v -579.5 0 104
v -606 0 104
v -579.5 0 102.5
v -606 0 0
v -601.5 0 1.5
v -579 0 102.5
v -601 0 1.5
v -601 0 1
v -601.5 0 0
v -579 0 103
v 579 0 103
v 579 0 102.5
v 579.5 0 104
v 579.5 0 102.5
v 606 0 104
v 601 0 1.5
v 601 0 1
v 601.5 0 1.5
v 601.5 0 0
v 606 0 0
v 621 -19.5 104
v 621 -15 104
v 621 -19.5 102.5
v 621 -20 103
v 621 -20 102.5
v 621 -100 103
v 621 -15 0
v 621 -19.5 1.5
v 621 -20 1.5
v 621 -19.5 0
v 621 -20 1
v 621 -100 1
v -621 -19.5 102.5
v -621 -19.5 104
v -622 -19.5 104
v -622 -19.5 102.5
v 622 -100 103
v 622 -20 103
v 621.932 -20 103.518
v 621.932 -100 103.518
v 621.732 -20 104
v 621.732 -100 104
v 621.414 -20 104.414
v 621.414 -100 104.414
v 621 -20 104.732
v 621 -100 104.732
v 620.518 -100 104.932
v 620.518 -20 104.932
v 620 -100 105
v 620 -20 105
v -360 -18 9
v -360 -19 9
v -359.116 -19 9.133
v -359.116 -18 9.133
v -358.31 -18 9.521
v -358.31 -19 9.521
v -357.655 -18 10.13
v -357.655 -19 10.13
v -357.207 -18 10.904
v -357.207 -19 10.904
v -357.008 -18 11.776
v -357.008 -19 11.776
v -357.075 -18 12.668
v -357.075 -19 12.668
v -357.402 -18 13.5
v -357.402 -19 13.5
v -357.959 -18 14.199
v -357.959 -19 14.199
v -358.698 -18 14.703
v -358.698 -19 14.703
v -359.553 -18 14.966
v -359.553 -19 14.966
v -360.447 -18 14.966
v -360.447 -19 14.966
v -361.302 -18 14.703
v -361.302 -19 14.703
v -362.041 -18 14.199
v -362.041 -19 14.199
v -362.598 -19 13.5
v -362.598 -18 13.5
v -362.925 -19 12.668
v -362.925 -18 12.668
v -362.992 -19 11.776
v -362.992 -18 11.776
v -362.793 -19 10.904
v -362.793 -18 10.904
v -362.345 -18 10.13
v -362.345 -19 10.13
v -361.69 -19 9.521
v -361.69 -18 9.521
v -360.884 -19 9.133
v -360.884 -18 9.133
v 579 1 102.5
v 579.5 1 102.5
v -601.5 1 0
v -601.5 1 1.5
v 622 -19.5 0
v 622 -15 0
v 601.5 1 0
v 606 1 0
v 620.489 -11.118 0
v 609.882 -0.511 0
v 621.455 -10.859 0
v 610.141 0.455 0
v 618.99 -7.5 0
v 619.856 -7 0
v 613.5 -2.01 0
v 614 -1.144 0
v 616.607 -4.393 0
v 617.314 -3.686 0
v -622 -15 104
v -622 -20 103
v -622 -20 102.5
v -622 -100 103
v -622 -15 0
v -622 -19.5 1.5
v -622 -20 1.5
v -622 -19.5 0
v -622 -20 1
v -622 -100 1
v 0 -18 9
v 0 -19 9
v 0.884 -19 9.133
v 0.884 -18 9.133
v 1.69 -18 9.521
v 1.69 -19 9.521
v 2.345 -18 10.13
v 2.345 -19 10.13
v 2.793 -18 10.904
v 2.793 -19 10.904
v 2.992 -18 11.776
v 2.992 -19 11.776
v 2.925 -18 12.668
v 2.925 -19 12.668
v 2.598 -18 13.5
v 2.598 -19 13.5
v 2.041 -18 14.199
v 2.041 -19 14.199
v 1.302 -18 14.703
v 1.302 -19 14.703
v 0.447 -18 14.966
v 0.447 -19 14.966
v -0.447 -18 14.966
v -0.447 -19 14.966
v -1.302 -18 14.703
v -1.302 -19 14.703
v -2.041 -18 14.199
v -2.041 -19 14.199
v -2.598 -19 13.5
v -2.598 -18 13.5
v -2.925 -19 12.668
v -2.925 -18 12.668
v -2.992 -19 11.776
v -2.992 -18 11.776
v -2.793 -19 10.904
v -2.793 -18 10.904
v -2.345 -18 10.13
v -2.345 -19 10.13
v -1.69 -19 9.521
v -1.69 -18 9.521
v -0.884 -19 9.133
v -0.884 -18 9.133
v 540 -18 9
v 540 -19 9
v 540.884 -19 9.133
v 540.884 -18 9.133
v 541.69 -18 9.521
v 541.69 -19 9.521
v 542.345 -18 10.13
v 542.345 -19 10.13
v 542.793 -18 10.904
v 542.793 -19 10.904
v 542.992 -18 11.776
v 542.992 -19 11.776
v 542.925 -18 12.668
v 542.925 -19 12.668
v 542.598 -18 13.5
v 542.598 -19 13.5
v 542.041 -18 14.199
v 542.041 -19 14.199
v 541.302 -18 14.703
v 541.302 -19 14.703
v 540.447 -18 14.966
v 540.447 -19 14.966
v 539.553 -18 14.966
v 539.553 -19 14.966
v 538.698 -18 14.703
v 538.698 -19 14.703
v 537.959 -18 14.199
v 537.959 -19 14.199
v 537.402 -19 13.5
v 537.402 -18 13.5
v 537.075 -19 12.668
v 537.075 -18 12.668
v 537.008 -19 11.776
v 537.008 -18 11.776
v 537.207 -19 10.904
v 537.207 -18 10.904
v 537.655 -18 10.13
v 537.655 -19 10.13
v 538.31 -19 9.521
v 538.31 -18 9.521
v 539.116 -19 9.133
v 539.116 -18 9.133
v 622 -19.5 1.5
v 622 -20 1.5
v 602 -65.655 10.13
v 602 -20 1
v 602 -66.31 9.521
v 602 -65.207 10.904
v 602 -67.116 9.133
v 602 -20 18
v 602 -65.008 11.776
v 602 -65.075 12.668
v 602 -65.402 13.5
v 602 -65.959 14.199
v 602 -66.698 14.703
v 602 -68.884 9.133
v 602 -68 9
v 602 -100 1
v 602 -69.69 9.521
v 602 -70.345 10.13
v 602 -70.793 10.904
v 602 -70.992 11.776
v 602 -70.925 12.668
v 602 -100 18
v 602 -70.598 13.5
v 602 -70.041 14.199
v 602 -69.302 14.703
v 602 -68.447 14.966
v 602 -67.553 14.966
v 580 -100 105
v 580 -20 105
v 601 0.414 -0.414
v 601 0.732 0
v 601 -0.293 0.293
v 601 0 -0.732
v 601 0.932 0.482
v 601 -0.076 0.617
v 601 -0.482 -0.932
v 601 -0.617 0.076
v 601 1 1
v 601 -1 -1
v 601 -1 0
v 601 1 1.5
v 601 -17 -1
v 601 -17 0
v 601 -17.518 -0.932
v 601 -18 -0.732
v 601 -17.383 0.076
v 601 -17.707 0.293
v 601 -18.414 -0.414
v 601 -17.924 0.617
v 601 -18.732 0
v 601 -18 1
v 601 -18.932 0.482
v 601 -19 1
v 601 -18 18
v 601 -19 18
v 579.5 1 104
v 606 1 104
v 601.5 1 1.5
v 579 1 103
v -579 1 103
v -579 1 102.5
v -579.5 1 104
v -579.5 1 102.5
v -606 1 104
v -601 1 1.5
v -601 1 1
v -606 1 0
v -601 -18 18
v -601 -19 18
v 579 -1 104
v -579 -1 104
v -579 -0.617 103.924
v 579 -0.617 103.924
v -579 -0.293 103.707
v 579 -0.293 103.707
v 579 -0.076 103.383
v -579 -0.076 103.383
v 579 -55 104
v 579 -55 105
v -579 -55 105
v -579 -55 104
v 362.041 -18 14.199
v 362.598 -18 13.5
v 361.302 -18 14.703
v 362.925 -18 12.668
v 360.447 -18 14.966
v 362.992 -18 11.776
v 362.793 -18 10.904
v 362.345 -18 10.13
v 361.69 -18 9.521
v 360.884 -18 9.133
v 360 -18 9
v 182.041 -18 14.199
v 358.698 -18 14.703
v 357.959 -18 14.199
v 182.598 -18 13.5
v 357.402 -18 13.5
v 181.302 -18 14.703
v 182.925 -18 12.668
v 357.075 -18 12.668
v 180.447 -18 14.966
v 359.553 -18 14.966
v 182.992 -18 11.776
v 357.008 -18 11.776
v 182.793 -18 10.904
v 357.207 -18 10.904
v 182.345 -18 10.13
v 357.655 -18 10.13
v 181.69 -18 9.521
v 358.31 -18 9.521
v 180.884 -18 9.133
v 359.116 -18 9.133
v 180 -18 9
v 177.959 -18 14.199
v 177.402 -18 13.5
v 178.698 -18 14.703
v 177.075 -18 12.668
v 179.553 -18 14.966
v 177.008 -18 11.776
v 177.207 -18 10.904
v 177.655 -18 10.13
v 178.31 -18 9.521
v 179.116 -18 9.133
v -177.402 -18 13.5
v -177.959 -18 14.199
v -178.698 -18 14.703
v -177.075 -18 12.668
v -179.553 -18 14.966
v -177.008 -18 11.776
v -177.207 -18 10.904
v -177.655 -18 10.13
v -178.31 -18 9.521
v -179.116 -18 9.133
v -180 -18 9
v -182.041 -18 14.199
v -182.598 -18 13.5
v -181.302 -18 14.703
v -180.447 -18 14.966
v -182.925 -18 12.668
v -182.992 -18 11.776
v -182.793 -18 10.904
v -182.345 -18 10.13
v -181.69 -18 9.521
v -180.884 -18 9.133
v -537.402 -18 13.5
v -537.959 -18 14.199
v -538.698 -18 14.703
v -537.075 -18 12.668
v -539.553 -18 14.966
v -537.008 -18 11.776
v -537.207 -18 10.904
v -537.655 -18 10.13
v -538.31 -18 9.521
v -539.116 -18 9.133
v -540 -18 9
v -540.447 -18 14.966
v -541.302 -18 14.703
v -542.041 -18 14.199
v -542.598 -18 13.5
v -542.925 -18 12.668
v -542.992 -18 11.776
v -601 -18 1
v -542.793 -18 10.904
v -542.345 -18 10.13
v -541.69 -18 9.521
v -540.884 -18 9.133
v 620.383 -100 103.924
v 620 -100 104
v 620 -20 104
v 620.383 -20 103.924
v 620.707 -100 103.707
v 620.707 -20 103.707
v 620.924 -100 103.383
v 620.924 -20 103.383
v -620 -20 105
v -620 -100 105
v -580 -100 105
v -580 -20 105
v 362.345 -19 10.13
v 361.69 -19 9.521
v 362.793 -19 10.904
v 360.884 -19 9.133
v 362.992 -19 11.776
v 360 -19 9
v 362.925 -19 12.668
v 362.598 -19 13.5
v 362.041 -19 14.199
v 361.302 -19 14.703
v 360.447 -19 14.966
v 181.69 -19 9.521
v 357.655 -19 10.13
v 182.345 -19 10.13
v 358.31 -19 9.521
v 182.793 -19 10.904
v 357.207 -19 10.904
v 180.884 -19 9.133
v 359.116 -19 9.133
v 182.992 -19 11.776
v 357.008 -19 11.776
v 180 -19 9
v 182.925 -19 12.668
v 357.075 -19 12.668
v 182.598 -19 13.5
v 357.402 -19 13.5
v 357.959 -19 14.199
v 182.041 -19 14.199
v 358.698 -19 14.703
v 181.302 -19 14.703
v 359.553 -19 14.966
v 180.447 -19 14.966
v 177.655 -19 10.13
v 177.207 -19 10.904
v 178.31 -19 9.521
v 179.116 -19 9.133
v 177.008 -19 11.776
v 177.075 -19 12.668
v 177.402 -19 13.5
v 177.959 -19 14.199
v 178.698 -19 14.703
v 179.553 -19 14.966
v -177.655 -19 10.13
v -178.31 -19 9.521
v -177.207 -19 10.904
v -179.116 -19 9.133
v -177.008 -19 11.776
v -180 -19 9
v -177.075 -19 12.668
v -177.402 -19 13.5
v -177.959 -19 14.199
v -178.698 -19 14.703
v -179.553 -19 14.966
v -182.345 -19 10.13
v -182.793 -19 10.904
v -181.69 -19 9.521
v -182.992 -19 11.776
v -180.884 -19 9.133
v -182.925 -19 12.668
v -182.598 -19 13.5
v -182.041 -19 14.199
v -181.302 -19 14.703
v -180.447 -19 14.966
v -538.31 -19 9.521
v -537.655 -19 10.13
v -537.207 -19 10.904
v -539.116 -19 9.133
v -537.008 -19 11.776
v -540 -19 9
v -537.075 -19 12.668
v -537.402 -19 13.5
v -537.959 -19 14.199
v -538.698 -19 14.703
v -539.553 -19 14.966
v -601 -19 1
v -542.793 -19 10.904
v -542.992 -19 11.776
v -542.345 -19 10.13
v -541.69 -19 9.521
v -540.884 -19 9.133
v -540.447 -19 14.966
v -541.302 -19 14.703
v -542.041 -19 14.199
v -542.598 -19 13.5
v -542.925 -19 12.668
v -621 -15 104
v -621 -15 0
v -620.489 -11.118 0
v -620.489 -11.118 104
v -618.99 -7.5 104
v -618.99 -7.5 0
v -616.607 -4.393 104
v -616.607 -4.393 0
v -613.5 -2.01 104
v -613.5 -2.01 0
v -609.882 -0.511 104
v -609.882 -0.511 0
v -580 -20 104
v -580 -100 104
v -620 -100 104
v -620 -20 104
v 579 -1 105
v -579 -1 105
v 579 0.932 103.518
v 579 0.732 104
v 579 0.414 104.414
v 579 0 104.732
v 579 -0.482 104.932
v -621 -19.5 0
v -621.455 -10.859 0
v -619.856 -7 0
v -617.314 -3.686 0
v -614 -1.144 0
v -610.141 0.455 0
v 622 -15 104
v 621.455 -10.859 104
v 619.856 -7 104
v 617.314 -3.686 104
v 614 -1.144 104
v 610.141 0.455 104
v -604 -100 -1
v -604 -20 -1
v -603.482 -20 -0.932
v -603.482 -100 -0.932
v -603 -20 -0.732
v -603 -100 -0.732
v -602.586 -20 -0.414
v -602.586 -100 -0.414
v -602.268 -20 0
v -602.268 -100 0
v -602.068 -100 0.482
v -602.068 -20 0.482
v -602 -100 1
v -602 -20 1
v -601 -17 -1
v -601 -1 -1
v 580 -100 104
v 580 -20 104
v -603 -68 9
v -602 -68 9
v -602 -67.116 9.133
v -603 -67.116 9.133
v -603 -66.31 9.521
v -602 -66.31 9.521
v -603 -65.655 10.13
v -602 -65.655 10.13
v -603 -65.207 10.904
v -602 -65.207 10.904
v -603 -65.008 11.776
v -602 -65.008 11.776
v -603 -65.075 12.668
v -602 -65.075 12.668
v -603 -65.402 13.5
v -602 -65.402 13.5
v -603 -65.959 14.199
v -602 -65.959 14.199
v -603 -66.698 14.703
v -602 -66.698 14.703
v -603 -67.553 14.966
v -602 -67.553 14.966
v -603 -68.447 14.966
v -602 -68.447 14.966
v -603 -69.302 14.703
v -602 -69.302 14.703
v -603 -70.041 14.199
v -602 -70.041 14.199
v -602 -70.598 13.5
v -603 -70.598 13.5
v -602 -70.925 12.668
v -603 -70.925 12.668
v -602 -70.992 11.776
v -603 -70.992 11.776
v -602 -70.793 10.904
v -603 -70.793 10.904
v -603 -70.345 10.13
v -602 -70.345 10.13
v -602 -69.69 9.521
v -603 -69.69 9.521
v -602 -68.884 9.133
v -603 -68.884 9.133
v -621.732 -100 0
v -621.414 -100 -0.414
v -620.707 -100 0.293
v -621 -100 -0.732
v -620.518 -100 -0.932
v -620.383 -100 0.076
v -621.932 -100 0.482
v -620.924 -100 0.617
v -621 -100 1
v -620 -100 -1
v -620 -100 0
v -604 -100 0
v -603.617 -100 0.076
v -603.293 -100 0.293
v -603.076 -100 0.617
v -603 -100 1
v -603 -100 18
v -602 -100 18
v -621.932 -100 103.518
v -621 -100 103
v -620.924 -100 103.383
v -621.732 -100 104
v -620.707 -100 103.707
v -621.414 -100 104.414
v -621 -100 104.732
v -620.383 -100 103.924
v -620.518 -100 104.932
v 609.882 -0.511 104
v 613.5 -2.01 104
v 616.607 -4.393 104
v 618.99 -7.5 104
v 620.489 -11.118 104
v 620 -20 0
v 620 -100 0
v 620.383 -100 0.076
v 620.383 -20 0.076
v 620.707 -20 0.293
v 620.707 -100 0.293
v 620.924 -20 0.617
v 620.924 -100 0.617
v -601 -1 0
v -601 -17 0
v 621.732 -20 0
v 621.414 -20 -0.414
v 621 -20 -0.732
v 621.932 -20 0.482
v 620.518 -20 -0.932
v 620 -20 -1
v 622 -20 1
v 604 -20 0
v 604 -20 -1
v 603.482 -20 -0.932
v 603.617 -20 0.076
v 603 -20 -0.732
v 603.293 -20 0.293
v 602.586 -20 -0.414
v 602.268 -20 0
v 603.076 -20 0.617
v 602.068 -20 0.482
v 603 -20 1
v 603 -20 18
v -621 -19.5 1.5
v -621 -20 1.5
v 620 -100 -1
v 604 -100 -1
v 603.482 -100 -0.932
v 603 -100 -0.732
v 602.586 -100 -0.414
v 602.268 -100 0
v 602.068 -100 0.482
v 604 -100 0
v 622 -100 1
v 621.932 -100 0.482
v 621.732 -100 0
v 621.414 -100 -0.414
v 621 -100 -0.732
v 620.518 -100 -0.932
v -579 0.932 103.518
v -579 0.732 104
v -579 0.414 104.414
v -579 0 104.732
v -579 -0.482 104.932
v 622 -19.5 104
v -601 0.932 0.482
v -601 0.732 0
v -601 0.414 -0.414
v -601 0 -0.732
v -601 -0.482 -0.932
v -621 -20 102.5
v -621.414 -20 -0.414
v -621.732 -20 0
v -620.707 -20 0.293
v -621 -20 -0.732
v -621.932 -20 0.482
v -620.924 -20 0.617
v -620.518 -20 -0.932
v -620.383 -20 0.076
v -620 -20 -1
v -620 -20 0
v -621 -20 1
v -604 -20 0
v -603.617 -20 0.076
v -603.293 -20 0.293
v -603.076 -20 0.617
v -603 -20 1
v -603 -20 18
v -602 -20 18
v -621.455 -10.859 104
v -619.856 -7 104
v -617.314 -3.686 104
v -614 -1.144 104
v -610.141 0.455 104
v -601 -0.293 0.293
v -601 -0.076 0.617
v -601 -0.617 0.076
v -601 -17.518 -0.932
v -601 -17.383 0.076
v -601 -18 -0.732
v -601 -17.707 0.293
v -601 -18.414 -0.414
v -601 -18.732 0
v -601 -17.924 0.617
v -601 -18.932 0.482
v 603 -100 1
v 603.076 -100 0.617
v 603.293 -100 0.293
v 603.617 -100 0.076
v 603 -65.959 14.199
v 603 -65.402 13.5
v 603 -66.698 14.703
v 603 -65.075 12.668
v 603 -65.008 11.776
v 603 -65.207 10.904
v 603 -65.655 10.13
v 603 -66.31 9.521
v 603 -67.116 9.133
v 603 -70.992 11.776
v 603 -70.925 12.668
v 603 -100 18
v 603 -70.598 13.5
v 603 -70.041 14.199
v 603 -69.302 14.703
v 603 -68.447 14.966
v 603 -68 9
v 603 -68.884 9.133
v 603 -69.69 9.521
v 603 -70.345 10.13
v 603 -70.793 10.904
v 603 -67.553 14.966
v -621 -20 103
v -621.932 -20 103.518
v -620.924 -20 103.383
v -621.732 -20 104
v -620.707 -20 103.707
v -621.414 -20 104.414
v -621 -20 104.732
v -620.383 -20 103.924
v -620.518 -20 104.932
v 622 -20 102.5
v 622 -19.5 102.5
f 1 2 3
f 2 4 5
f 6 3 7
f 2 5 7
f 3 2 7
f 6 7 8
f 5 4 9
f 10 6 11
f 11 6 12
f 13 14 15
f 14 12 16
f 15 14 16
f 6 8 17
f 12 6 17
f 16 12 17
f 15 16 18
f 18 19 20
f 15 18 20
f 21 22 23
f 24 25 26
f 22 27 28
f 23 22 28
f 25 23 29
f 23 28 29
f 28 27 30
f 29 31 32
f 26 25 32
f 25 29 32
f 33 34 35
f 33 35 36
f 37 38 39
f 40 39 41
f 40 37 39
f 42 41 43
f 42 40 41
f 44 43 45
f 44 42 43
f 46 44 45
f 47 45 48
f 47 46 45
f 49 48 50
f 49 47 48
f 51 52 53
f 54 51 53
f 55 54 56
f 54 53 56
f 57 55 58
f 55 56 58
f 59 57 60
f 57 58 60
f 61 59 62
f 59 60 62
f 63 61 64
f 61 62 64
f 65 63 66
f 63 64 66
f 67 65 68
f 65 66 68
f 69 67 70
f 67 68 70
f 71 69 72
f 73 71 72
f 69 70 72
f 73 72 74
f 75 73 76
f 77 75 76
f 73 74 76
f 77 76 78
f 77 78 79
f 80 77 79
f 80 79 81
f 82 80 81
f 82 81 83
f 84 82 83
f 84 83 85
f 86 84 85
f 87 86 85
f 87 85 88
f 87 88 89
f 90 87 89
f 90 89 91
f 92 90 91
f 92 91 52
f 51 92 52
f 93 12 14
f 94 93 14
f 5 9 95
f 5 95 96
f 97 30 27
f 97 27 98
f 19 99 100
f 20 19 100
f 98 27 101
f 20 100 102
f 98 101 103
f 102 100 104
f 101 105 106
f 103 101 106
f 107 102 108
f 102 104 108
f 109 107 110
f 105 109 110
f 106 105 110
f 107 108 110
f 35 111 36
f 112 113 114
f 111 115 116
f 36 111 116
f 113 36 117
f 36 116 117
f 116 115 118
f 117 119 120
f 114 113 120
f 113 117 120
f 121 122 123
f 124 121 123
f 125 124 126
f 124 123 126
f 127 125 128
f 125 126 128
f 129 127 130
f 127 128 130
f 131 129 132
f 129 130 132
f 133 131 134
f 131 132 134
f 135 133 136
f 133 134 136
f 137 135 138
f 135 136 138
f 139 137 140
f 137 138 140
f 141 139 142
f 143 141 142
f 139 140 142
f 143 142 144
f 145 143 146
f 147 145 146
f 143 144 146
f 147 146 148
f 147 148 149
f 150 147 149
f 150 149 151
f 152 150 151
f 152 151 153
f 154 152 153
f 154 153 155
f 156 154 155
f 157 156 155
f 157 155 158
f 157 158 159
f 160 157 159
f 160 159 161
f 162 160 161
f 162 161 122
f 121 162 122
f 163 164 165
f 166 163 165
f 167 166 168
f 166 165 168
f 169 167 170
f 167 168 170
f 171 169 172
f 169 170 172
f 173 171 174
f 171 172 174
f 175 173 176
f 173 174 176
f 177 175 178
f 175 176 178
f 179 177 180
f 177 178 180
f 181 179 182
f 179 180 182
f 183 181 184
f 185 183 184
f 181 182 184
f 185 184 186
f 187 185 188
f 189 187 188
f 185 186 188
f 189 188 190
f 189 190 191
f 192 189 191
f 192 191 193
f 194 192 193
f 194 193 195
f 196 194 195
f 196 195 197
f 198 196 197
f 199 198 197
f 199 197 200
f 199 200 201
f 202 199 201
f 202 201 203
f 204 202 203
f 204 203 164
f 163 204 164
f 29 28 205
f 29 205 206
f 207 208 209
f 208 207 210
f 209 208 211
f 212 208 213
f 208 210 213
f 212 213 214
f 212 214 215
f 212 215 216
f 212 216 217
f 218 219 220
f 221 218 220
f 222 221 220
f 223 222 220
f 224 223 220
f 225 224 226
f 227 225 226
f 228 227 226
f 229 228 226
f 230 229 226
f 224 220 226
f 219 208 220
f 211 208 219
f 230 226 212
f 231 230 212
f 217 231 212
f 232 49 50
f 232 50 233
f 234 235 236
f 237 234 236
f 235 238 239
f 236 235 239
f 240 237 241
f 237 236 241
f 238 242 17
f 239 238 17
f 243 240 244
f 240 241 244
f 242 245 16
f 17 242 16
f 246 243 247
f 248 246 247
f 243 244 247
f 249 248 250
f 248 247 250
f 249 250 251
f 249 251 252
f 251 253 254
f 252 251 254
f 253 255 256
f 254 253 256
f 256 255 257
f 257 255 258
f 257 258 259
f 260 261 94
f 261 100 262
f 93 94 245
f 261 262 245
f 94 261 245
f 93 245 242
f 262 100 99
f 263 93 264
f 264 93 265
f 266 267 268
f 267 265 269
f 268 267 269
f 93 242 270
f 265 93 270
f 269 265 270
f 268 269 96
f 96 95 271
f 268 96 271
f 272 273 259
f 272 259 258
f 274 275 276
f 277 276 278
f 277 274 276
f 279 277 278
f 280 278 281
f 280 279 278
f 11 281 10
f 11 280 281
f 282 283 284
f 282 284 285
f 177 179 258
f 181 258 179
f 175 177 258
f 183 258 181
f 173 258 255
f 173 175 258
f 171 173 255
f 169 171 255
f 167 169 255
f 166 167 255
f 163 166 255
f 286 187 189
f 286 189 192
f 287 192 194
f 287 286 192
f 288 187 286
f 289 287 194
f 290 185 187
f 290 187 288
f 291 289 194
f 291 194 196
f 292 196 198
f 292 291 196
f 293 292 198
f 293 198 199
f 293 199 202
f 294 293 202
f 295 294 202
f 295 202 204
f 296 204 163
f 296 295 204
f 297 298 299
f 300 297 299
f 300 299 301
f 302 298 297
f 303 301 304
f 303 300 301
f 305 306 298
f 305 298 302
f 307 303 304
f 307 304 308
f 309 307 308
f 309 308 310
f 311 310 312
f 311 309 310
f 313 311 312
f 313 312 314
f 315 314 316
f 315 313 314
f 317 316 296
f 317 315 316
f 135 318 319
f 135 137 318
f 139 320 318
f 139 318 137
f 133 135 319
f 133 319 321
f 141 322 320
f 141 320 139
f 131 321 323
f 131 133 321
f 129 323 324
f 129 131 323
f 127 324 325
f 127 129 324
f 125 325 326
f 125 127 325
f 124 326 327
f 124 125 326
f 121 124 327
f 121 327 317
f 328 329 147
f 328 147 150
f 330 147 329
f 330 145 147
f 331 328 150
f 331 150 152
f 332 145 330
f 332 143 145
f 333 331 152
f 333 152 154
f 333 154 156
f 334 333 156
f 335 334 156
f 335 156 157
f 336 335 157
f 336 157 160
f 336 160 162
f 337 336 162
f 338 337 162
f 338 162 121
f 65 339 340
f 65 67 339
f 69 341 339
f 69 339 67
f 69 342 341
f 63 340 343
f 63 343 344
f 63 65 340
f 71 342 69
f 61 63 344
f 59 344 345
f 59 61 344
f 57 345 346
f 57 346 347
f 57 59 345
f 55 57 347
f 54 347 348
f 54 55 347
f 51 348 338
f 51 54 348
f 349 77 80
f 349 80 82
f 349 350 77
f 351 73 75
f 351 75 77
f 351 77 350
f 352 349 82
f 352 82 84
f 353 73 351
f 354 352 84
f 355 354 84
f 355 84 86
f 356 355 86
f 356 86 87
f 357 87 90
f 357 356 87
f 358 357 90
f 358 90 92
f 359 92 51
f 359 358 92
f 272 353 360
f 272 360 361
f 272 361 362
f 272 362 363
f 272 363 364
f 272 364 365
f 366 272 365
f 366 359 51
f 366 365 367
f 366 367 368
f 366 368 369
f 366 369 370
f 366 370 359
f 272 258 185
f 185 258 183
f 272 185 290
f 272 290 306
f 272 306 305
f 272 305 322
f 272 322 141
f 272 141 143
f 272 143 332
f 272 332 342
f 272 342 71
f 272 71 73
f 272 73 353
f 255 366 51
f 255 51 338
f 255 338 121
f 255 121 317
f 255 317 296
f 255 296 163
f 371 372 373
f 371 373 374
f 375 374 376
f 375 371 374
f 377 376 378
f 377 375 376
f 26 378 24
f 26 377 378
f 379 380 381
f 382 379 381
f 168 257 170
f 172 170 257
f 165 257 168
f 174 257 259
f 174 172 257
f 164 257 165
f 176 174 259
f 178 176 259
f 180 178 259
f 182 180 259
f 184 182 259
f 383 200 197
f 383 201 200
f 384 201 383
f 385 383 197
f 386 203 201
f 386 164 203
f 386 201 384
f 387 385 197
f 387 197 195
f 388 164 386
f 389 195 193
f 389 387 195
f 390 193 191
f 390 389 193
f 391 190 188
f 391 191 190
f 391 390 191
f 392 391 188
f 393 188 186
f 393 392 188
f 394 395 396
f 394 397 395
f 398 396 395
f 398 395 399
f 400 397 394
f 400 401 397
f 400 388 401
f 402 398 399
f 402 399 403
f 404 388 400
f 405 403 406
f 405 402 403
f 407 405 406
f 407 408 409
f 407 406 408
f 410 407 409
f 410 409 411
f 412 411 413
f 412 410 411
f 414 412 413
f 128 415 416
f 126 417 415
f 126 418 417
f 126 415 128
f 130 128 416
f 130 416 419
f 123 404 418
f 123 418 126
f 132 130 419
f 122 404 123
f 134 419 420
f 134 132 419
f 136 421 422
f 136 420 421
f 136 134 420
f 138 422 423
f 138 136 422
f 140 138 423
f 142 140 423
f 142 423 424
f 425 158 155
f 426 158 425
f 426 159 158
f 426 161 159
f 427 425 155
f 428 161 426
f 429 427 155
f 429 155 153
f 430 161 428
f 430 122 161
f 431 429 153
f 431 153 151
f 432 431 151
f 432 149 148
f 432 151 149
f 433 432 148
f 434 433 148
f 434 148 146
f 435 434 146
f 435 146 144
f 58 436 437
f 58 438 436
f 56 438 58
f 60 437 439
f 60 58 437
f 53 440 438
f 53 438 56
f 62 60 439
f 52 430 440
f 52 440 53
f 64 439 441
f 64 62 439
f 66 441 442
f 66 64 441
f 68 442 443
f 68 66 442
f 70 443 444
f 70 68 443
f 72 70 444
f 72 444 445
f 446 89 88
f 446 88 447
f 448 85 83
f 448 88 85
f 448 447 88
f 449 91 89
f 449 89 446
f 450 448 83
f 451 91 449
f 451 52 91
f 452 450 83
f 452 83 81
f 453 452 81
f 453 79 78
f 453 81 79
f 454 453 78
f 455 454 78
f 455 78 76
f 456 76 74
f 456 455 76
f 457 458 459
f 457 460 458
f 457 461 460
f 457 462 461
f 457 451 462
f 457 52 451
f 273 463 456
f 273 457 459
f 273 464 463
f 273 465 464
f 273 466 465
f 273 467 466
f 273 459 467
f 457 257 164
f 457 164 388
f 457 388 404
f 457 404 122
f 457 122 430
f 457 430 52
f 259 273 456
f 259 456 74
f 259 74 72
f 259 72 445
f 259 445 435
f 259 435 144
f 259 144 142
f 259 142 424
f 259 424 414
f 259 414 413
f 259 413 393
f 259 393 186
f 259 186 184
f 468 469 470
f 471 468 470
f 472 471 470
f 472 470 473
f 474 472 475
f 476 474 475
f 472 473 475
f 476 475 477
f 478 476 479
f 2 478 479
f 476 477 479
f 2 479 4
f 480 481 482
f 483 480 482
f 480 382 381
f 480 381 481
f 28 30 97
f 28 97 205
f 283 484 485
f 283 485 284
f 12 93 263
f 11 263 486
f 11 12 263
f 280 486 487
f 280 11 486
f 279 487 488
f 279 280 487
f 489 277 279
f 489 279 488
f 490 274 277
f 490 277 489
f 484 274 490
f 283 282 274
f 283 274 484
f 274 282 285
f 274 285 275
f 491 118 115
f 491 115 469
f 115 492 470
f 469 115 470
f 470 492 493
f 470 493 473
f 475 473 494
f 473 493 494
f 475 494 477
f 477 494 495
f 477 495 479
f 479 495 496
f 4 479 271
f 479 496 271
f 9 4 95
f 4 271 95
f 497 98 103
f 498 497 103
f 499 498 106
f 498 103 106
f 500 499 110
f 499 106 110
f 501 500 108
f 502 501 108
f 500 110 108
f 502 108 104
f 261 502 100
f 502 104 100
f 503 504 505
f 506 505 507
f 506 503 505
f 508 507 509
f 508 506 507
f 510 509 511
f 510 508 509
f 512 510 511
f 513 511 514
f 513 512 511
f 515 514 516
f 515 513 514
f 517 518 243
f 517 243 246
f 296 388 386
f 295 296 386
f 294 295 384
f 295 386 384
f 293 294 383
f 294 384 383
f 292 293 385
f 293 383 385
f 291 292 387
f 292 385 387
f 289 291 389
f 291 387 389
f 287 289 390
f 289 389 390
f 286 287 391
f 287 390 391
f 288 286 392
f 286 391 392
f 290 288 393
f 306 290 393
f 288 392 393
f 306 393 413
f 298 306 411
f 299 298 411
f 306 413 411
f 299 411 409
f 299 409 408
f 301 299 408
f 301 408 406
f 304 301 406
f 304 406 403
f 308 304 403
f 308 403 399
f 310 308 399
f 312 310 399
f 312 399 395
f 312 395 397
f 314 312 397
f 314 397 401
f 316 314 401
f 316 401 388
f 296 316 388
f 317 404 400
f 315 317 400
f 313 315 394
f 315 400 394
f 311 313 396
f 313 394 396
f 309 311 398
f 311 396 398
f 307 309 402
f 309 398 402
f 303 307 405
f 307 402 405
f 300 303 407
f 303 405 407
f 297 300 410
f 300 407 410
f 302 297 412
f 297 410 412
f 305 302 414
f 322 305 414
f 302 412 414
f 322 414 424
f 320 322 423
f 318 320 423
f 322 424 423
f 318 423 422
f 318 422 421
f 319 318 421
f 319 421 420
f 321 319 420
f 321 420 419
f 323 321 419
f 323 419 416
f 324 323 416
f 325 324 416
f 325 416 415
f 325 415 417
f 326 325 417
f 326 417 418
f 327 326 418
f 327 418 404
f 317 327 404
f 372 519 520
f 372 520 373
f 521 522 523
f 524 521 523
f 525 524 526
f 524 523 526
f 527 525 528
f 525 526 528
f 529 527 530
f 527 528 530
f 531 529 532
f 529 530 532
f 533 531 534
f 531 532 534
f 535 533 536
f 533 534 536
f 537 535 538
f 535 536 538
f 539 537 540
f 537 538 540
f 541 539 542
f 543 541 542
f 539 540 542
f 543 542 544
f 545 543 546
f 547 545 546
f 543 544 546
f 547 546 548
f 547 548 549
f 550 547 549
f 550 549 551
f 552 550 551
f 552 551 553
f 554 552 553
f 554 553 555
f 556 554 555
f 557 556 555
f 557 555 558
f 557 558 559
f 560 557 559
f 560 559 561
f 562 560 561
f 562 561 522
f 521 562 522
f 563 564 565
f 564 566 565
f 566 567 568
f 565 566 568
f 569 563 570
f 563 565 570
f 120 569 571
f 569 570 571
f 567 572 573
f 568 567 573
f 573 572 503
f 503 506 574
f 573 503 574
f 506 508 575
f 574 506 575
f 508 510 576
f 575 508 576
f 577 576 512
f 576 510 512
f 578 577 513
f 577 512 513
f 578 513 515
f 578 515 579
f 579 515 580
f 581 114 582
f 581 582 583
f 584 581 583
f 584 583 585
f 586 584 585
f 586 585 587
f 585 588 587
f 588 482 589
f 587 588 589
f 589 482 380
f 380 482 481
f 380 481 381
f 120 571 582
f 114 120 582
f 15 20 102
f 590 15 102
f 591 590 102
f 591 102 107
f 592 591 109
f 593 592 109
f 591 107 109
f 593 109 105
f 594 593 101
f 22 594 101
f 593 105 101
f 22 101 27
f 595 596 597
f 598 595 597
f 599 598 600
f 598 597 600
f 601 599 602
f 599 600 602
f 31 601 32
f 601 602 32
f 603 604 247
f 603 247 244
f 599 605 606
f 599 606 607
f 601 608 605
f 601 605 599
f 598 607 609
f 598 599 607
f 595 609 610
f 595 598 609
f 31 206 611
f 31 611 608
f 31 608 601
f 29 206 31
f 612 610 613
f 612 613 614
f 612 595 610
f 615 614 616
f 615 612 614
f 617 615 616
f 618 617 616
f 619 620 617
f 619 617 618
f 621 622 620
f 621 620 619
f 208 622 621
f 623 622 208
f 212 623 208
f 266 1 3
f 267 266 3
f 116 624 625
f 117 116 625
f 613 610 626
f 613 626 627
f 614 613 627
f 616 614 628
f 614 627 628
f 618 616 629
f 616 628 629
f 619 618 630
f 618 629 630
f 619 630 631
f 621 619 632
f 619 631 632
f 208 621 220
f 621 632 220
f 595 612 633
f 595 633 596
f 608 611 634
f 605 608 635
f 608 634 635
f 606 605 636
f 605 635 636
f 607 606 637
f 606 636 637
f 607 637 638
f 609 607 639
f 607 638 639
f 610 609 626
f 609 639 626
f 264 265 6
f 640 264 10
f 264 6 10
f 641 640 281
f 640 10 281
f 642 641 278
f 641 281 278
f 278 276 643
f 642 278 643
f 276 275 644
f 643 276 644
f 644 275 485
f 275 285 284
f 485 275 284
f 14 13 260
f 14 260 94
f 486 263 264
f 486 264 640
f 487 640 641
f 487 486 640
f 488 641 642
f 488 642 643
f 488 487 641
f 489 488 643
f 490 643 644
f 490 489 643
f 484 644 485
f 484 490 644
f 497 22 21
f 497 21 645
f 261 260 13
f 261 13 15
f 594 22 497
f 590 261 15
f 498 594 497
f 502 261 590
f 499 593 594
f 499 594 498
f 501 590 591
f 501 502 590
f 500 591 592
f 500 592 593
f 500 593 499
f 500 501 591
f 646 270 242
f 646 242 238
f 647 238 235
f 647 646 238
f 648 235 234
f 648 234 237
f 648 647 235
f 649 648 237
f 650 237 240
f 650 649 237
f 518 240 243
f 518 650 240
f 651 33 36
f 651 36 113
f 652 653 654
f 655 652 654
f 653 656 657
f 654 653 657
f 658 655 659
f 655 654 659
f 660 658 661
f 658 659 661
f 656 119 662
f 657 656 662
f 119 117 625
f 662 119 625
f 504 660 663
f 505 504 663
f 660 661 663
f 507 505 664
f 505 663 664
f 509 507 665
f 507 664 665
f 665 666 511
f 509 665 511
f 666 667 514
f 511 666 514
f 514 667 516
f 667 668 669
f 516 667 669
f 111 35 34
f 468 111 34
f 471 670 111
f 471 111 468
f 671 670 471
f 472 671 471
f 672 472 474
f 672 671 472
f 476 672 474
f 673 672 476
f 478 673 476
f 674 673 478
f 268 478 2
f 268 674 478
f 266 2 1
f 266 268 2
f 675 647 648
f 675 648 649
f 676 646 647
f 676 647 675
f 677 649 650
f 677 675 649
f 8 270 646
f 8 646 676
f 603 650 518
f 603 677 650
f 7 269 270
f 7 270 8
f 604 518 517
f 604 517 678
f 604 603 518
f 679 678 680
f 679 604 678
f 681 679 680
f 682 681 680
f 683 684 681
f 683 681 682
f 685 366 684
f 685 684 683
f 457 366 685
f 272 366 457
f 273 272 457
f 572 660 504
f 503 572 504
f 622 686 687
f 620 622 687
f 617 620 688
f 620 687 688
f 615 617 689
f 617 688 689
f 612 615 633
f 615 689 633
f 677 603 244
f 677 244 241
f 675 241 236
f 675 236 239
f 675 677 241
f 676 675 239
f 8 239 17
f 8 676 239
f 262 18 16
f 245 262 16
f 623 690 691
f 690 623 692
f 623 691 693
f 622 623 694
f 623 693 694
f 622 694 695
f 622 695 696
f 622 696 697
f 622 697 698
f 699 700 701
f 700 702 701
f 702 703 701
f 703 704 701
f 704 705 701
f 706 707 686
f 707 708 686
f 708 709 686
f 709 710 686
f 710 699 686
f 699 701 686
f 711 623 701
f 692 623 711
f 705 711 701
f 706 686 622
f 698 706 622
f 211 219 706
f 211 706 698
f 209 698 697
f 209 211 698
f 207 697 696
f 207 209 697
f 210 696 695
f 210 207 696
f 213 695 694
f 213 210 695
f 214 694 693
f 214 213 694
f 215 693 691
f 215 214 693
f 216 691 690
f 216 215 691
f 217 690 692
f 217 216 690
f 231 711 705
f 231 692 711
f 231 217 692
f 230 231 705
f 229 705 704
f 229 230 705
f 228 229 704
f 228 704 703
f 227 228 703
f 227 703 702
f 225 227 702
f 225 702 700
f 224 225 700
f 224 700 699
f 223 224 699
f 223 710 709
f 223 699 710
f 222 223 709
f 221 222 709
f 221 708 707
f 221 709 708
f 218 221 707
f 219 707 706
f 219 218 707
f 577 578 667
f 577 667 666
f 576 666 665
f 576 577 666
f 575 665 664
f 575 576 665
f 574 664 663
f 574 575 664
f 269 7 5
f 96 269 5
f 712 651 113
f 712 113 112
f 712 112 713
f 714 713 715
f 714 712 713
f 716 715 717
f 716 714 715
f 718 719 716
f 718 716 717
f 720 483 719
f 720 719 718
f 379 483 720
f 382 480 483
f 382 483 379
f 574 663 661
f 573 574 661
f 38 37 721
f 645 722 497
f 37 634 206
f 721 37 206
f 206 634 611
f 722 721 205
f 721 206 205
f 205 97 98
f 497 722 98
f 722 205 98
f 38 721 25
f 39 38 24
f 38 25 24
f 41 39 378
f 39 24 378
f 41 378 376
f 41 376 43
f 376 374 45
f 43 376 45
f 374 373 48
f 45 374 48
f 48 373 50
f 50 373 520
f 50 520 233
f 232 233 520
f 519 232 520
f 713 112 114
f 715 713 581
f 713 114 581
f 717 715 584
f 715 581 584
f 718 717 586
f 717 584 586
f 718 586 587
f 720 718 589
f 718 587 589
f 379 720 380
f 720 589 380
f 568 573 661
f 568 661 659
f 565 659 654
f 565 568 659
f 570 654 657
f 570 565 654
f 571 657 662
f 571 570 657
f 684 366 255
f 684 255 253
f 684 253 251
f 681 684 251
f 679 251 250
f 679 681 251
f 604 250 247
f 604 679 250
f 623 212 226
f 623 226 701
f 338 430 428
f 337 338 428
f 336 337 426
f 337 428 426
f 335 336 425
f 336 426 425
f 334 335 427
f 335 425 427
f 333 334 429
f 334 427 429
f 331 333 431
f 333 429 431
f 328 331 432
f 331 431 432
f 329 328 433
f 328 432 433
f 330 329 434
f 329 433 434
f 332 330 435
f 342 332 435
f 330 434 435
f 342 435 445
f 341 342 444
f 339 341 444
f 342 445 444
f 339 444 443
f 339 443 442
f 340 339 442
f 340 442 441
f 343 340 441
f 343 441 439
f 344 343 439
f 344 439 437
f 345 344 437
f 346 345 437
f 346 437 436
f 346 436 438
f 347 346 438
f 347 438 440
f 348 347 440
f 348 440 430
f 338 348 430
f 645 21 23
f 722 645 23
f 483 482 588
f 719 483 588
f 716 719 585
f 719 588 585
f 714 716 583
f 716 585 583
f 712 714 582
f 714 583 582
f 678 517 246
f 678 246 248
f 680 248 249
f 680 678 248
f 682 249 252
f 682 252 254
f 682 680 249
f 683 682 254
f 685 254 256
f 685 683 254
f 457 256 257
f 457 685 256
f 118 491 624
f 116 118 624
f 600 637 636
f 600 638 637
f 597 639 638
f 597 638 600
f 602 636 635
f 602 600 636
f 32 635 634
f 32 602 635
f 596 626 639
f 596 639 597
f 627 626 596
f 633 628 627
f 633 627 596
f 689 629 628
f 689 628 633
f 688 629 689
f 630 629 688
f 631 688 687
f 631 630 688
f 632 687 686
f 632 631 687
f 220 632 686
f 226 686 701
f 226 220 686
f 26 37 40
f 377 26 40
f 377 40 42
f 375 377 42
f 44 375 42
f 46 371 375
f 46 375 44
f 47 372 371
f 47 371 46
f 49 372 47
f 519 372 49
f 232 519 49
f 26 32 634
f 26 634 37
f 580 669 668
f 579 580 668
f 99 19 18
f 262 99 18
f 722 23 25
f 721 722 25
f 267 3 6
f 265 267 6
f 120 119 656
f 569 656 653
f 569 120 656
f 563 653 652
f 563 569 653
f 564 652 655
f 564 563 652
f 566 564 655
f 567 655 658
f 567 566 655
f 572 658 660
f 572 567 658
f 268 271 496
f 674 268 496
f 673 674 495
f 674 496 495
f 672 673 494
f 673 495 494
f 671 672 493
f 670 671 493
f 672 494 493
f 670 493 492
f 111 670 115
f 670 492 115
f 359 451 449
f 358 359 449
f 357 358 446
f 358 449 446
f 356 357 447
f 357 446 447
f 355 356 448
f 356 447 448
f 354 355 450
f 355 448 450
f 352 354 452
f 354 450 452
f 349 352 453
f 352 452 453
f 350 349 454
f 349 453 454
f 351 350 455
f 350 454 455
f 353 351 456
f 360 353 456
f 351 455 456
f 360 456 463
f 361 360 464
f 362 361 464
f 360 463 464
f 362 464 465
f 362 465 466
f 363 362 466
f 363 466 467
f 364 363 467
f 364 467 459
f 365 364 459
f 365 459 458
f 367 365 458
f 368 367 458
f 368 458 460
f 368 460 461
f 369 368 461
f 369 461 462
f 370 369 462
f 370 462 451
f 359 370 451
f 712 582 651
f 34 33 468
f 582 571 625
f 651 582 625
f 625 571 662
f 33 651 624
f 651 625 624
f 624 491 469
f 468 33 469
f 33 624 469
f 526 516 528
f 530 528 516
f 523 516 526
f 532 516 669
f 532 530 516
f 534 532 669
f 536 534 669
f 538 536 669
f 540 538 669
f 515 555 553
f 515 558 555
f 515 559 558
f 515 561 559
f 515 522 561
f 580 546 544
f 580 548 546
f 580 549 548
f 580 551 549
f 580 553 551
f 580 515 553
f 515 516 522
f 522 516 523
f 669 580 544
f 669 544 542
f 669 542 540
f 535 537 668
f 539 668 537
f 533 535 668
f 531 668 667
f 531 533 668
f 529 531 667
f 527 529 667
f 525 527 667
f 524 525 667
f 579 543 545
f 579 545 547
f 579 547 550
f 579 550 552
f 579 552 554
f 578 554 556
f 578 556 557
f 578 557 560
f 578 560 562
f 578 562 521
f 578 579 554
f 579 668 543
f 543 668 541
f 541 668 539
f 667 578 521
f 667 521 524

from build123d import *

# Parameters (mm, degrees)
BASE_FLANGE1_DEPTH             = 104
EDGE_FLANGE1_STRIP_W           = 6
EDGE_FLANGE1_STRIP_H           = 1
EDGE_FLANGE1_STRIP_CUT_DEPTH   = 1202
EDGE_FLANGE1_RELIEF_W          = 6.5
EDGE_FLANGE1_RELIEF_H          = 0.5
EDGE_FLANGE1_RELIEF_CUT_DEPTH  = 1
EDGE_FLANGE1_DEPTH             = 1202
EDGE_FLANGE2_STRIP_W           = 6
EDGE_FLANGE2_STRIP_H           = 1
EDGE_FLANGE2_STRIP_CUT_DEPTH   = 1202
EDGE_FLANGE2_DEPTH             = 1202
EDGE_FLANGE3_STRIP_W           = 6
EDGE_FLANGE3_STRIP_H           = 1
EDGE_FLANGE3_STRIP_CUT_DEPTH   = 80
EDGE_FLANGE3_RELIEF_W          = 6.5
EDGE_FLANGE3_RELIEF_H          = 0.5
EDGE_FLANGE3_RELIEF_CUT_DEPTH  = 1
EDGE_FLANGE3_DEPTH             = 80
EDGE_FLANGE4_STRIP_W           = 6
EDGE_FLANGE4_STRIP_H           = 1
EDGE_FLANGE4_STRIP_CUT_DEPTH   = 80
EDGE_FLANGE4_DEPTH             = 80
EDGE_FLANGE5_STRIP_W           = 6
EDGE_FLANGE5_STRIP_H           = 1
EDGE_FLANGE5_STRIP_CUT_DEPTH   = 1158
EDGE_FLANGE5_RELIEF_W          = 6.5
EDGE_FLANGE5_RELIEF_H          = 0.5
EDGE_FLANGE5_RELIEF_CUT_DEPTH  = 1
EDGE_FLANGE5_DEPTH             = 1158
EDGE_FLANGE6_STRIP_W           = 6
EDGE_FLANGE6_STRIP_H           = 1
EDGE_FLANGE6_STRIP_CUT_DEPTH   = 80
EDGE_FLANGE6_RELIEF_W          = 6.5
EDGE_FLANGE6_RELIEF_H          = 0.5
EDGE_FLANGE6_RELIEF_CUT_DEPTH  = 1
EDGE_FLANGE6_DEPTH             = 80
SKETCH25_R                     = 3
CUT_EXTRUDE1_DEPTH             = 3
SKETCH26_R                     = 3
CUT_EXTRUDE2_DEPTH             = 3
CUT_EXTRUDE2_DIRECTION_2_REACH = 1234.559


# Sheet-metal steps are written as plain solids
with BuildPart() as part:
    # Sketch1 → Base-Flange1 (new body)
    with BuildSketch(Plane.XY):
        with BuildLine():
            Line((-621, -100), (-621, -15))
            ThreePointArc((-621, -15), (-616.606601718, -4.393398282), (-606, 0))
            Line((-606, 0), (606, 0))
            ThreePointArc((606, 0), (616.606601718, -4.393398282), (621, -15))
            Line((621, -15), (621, -100))
            Line((621, -100), (622, -100))
            Line((622, -100), (622, -15))
            ThreePointArc((622, -15), (617.313708499, -3.686291501), (606, 1))
            Line((606, 1), (-606, 1))
            ThreePointArc((-606, 1), (-617.313708499, -3.686291501), (-622, -15))
            Line((-622, -15), (-622, -100))
            Line((-622, -100), (-621, -100))
        make_face()
    extrude(amount=BASE_FLANGE1_DEPTH)

    # Edge-Flange1 strip (across the edge) → Edge-Flange1 strip cut (cut)
    with BuildSketch(Plane(origin=(-601, 0, 0), x_dir=(0, 0, 1), z_dir=(1, 0, 0))):
        with Locations((-2, -0.5)):
            Rectangle(EDGE_FLANGE1_STRIP_W, EDGE_FLANGE1_STRIP_H)
    extrude(amount=EDGE_FLANGE1_STRIP_CUT_DEPTH, mode=Mode.SUBTRACT)

    # Edge-Flange1 relief (on the sheet) → Edge-Flange1 relief cut (cut)
    with BuildSketch(Plane(origin=(-601, 0, 1), x_dir=(0, 0, 1), z_dir=(0, -1, 0))):
        with Locations((-2.75, 0.25)):
            Rectangle(EDGE_FLANGE1_RELIEF_W, EDGE_FLANGE1_RELIEF_H)
        with Locations((-2.75, -1202.25)):
            Rectangle(EDGE_FLANGE1_RELIEF_W, EDGE_FLANGE1_RELIEF_H)
    extrude(amount=-EDGE_FLANGE1_RELIEF_CUT_DEPTH, mode=Mode.SUBTRACT)

    # Edge-Flange1 section (across the edge) → Edge-Flange1 (add)
    with BuildSketch(Plane(origin=(-601, 0, 0), x_dir=(0, 0, 1), z_dir=(1, 0, 0))):
        with BuildLine():
            Line((-1, 1), (-1, 19))
            Line((-1, 19), (0, 19))
            Line((0, 19), (0, 1))
            ThreePointArc((0, 1), (0.292893219, 0.292893219), (1, 0))
            Line((1, 0), (1, -1))
            ThreePointArc((1, -1), (-0.414213562, -0.414213562), (-1, 1))
        make_face()
    extrude(amount=EDGE_FLANGE1_DEPTH)

    # Edge-Flange2 strip (across the edge) → Edge-Flange2 strip cut (cut)
    with BuildSketch(Plane(origin=(-601, -19, 0), x_dir=(0, 1, 0), z_dir=(1, 0, 0))):
        with Locations((-1, -0.5)):
            Rectangle(EDGE_FLANGE2_STRIP_W, EDGE_FLANGE2_STRIP_H)
    extrude(amount=EDGE_FLANGE2_STRIP_CUT_DEPTH, mode=Mode.SUBTRACT)

    # Edge-Flange2 section (across the edge) → Edge-Flange2 (add)
    with BuildSketch(Plane(origin=(-601, -19, 0), x_dir=(0, 1, 0), z_dir=(1, 0, 0))):
        with BuildLine():
            Line((0, 1), (0, 18))
            Line((0, 18), (1, 18))
            Line((1, 18), (1, 1))
            ThreePointArc((1, 1), (1.292893219, 0.292893219), (2, 0))
            Line((2, 0), (2, -1))
            ThreePointArc((2, -1), (0.585786438, -0.414213562), (0, 1))
        make_face()
    extrude(amount=EDGE_FLANGE2_DEPTH)

    # Edge-Flange3 strip (across the edge) → Edge-Flange3 strip cut (cut)
    with BuildSketch(Plane(origin=(-621, -100, 0), x_dir=(0, 0, 1), z_dir=(0, 1, 0))):
        with Locations((-2, -0.5)):
            Rectangle(EDGE_FLANGE3_STRIP_W, EDGE_FLANGE3_STRIP_H)
    edge_flange3_strip_cut = extrude(amount=EDGE_FLANGE3_STRIP_CUT_DEPTH, mode=Mode.SUBTRACT)

    # Edge-Flange3 relief (on the sheet) → Edge-Flange3 relief cut (cut)
    with BuildSketch(Plane(origin=(-621, -100, 1), x_dir=(0, 0, 1), z_dir=(1, 0, 0))):
        with Locations((-2.75, -80.25)):
            Rectangle(EDGE_FLANGE3_RELIEF_W, EDGE_FLANGE3_RELIEF_H)
    edge_flange3_relief_cut = extrude(amount=-EDGE_FLANGE3_RELIEF_CUT_DEPTH, mode=Mode.SUBTRACT)

    # Edge-Flange3 section (across the edge) → Edge-Flange3 (add)
    with BuildSketch(Plane(origin=(-621, -100, 0), x_dir=(0, 0, 1), z_dir=(0, 1, 0))):
        with BuildLine():
            Line((-1, 1), (-1, 19))
            Line((-1, 19), (0, 19))
            Line((0, 19), (0, 1))
            ThreePointArc((0, 1), (0.292893219, 0.292893219), (1, 0))
            Line((1, 0), (1, -1))
            ThreePointArc((1, -1), (-0.414213562, -0.414213562), (-1, 1))
        make_face()
    edge_flange3 = extrude(amount=EDGE_FLANGE3_DEPTH)

    # Edge-Flange4 strip (across the edge) → Edge-Flange4 strip cut (cut)
    with BuildSketch(Plane(origin=(-602, -100, 0), x_dir=(-1, 0, 0), z_dir=(0, 1, 0))):
        with Locations((-1, -0.5)):
            Rectangle(EDGE_FLANGE4_STRIP_W, EDGE_FLANGE4_STRIP_H)
    edge_flange4_strip_cut = extrude(amount=EDGE_FLANGE4_STRIP_CUT_DEPTH, mode=Mode.SUBTRACT)

    # Edge-Flange4 section (across the edge) → Edge-Flange4 (add)
    with BuildSketch(Plane(origin=(-602, -100, 0), x_dir=(-1, 0, 0), z_dir=(0, 1, 0))):
        with BuildLine():
            Line((0, 1), (0, 18))
            Line((0, 18), (1, 18))
            Line((1, 18), (1, 1))
            ThreePointArc((1, 1), (1.292893219, 0.292893219), (2, 0))
            Line((2, 0), (2, -1))
            ThreePointArc((2, -1), (0.585786438, -0.414213562), (0, 1))
        make_face()
    edge_flange4 = extrude(amount=EDGE_FLANGE4_DEPTH)

    # Mirror1: Edge-Flange3 strip cut, Edge-Flange3 relief cut, Edge-Flange3, Edge-Flange4 strip cut, Edge-Flange4 across plane
    add(edge_flange3_strip_cut.mirror(Plane(origin=(0, 0, 0), x_dir=(0, 0, 1), z_dir=(1, 0, 0))), mode=Mode.SUBTRACT)
    add(edge_flange3_relief_cut.mirror(Plane(origin=(0, 0, 0), x_dir=(0, 0, 1), z_dir=(1, 0, 0))), mode=Mode.SUBTRACT)
    add(edge_flange3.mirror(Plane(origin=(0, 0, 0), x_dir=(0, 0, 1), z_dir=(1, 0, 0))))
    add(edge_flange4_strip_cut.mirror(Plane(origin=(0, 0, 0), x_dir=(0, 0, 1), z_dir=(1, 0, 0))), mode=Mode.SUBTRACT)
    add(edge_flange4.mirror(Plane(origin=(0, 0, 0), x_dir=(0, 0, 1), z_dir=(1, 0, 0))))

    # Edge-Flange5 strip (across the edge) → Edge-Flange5 strip cut (cut)
    with BuildSketch(Plane(origin=(579, 0, 104), x_dir=(0, 0, -1), z_dir=(-1, 0, 0))):
        with Locations((-2, -0.5)):
            Rectangle(EDGE_FLANGE5_STRIP_W, EDGE_FLANGE5_STRIP_H)
    extrude(amount=EDGE_FLANGE5_STRIP_CUT_DEPTH, mode=Mode.SUBTRACT)

    # Edge-Flange5 relief (on the sheet) → Edge-Flange5 relief cut (cut)
    with BuildSketch(Plane(origin=(579, 0, 103), x_dir=(0, 0, -1), z_dir=(0, -1, 0))):
        with Locations((-2.75, 0.25)):
            Rectangle(EDGE_FLANGE5_RELIEF_W, EDGE_FLANGE5_RELIEF_H)
        with Locations((-2.75, -1158.25)):
            Rectangle(EDGE_FLANGE5_RELIEF_W, EDGE_FLANGE5_RELIEF_H)
    extrude(amount=-EDGE_FLANGE5_RELIEF_CUT_DEPTH, mode=Mode.SUBTRACT)

    # Edge-Flange5 section (across the edge) → Edge-Flange5 (add)
    with BuildSketch(Plane(origin=(579, 0, 104), x_dir=(0, 0, -1), z_dir=(-1, 0, 0))):
        with BuildLine():
            Line((-1, 1), (-1, 55))
            Line((-1, 55), (0, 55))
            Line((0, 55), (0, 1))
            ThreePointArc((0, 1), (0.292893219, 0.292893219), (1, 0))
            Line((1, 0), (1, -1))
            ThreePointArc((1, -1), (-0.414213562, -0.414213562), (-1, 1))
        make_face()
    extrude(amount=EDGE_FLANGE5_DEPTH)

    # Edge-Flange6 strip (across the edge) → Edge-Flange6 strip cut (cut)
    with BuildSketch(Plane(origin=(621, -100, 104), x_dir=(0, 0, -1), z_dir=(0, 1, 0))):
        with Locations((-2, -0.5)):
            Rectangle(EDGE_FLANGE6_STRIP_W, EDGE_FLANGE6_STRIP_H)
    edge_flange6_strip_cut = extrude(amount=EDGE_FLANGE6_STRIP_CUT_DEPTH, mode=Mode.SUBTRACT)

    # Edge-Flange6 relief (on the sheet) → Edge-Flange6 relief cut (cut)
    with BuildSketch(Plane(origin=(621, -100, 103), x_dir=(0, 0, -1), z_dir=(-1, 0, 0))):
        with Locations((-2.75, -80.25)):
            Rectangle(EDGE_FLANGE6_RELIEF_W, EDGE_FLANGE6_RELIEF_H)
    edge_flange6_relief_cut = extrude(amount=-EDGE_FLANGE6_RELIEF_CUT_DEPTH, mode=Mode.SUBTRACT)

    # Edge-Flange6 section (across the edge) → Edge-Flange6 (add)
    with BuildSketch(Plane(origin=(621, -100, 104), x_dir=(0, 0, -1), z_dir=(0, 1, 0))):
        with BuildLine():
            Line((-1, 1), (-1, 41))
            Line((-1, 41), (0, 41))
            Line((0, 41), (0, 1))
            ThreePointArc((0, 1), (0.292893219, 0.292893219), (1, 0))
            Line((1, 0), (1, -1))
            ThreePointArc((1, -1), (-0.414213562, -0.414213562), (-1, 1))
        make_face()
    edge_flange6 = extrude(amount=EDGE_FLANGE6_DEPTH)

    # Mirror2: Edge-Flange6 strip cut, Edge-Flange6 relief cut, Edge-Flange6 across plane
    add(edge_flange6_strip_cut.mirror(Plane(origin=(0, 0, 0), x_dir=(0, 0, 1), z_dir=(1, 0, 0))), mode=Mode.SUBTRACT)
    add(edge_flange6_relief_cut.mirror(Plane(origin=(0, 0, 0), x_dir=(0, 0, 1), z_dir=(1, 0, 0))), mode=Mode.SUBTRACT)
    add(edge_flange6.mirror(Plane(origin=(0, 0, 0), x_dir=(0, 0, 1), z_dir=(1, 0, 0))))

    # Sketch25 → Cut-Extrude1 (cut)
    with BuildSketch(Plane.XZ.offset(19)):
        with Locations(Location((-540, 12, 0), (0, 0, 270))):
            Circle(SKETCH25_R)
        with Locations(Location((-360, 12, 0), (0, 0, 270))):
            Circle(SKETCH25_R)
        with Locations(Location((-180, 12, 0), (0, 0, 270))):
            Circle(SKETCH25_R)
        with Locations(Location((0, 12, 0), (0, 0, 270))):
            Circle(SKETCH25_R)
        with Locations(Location((180, 12, 0), (0, 0, 270))):
            Circle(SKETCH25_R)
        with Locations(Location((360, 12, 0), (0, 0, 270))):
            Circle(SKETCH25_R)
        with Locations(Location((540, 12, 0), (0, 0, 270))):
            Circle(SKETCH25_R)
    extrude(amount=-CUT_EXTRUDE1_DEPTH, mode=Mode.SUBTRACT)

    # Sketch26 → Cut-Extrude2 (cut)
    with BuildSketch(Plane(origin=(-602, 0, 0), x_dir=(0, 0, -1), z_dir=(1, 0, 0))):
        with Locations((-12, -68)):
            Circle(SKETCH26_R)
    extrude(amount=-CUT_EXTRUDE2_DEPTH, mode=Mode.SUBTRACT)

    # Cut-Extrude2 direction 2: up to this face of the body (flat: up to its plane)
    cut_extrude2_direction_2_end = Plane(part.part.faces().sort_by_distance((603, -60, 9.5))[0])
    # Sketch26 → Cut-Extrude2 direction 2 (cut, up to the picked face)
    with BuildSketch(Plane(origin=(-602, 0, 0), x_dir=(0, 0, -1), z_dir=(1, 0, 0)), mode=Mode.PRIVATE) as cut_extrude2_direction_2_sk1:
        with Locations((-12, -68)):
            Circle(SKETCH26_R)
    cut_extrude2_direction_2_tool1 = split(extrude(cut_extrude2_direction_2_sk1.sketch, amount=CUT_EXTRUDE2_DIRECTION_2_REACH, mode=Mode.PRIVATE), bisect_by=cut_extrude2_direction_2_end, keep=Keep.BOTH, mode=Mode.PRIVATE)
    add(cut_extrude2_direction_2_tool1.solids().sort_by(Axis((-602, -68, 12), (1, 0, 0)))[0], mode=Mode.SUBTRACT)


solid = part.part
